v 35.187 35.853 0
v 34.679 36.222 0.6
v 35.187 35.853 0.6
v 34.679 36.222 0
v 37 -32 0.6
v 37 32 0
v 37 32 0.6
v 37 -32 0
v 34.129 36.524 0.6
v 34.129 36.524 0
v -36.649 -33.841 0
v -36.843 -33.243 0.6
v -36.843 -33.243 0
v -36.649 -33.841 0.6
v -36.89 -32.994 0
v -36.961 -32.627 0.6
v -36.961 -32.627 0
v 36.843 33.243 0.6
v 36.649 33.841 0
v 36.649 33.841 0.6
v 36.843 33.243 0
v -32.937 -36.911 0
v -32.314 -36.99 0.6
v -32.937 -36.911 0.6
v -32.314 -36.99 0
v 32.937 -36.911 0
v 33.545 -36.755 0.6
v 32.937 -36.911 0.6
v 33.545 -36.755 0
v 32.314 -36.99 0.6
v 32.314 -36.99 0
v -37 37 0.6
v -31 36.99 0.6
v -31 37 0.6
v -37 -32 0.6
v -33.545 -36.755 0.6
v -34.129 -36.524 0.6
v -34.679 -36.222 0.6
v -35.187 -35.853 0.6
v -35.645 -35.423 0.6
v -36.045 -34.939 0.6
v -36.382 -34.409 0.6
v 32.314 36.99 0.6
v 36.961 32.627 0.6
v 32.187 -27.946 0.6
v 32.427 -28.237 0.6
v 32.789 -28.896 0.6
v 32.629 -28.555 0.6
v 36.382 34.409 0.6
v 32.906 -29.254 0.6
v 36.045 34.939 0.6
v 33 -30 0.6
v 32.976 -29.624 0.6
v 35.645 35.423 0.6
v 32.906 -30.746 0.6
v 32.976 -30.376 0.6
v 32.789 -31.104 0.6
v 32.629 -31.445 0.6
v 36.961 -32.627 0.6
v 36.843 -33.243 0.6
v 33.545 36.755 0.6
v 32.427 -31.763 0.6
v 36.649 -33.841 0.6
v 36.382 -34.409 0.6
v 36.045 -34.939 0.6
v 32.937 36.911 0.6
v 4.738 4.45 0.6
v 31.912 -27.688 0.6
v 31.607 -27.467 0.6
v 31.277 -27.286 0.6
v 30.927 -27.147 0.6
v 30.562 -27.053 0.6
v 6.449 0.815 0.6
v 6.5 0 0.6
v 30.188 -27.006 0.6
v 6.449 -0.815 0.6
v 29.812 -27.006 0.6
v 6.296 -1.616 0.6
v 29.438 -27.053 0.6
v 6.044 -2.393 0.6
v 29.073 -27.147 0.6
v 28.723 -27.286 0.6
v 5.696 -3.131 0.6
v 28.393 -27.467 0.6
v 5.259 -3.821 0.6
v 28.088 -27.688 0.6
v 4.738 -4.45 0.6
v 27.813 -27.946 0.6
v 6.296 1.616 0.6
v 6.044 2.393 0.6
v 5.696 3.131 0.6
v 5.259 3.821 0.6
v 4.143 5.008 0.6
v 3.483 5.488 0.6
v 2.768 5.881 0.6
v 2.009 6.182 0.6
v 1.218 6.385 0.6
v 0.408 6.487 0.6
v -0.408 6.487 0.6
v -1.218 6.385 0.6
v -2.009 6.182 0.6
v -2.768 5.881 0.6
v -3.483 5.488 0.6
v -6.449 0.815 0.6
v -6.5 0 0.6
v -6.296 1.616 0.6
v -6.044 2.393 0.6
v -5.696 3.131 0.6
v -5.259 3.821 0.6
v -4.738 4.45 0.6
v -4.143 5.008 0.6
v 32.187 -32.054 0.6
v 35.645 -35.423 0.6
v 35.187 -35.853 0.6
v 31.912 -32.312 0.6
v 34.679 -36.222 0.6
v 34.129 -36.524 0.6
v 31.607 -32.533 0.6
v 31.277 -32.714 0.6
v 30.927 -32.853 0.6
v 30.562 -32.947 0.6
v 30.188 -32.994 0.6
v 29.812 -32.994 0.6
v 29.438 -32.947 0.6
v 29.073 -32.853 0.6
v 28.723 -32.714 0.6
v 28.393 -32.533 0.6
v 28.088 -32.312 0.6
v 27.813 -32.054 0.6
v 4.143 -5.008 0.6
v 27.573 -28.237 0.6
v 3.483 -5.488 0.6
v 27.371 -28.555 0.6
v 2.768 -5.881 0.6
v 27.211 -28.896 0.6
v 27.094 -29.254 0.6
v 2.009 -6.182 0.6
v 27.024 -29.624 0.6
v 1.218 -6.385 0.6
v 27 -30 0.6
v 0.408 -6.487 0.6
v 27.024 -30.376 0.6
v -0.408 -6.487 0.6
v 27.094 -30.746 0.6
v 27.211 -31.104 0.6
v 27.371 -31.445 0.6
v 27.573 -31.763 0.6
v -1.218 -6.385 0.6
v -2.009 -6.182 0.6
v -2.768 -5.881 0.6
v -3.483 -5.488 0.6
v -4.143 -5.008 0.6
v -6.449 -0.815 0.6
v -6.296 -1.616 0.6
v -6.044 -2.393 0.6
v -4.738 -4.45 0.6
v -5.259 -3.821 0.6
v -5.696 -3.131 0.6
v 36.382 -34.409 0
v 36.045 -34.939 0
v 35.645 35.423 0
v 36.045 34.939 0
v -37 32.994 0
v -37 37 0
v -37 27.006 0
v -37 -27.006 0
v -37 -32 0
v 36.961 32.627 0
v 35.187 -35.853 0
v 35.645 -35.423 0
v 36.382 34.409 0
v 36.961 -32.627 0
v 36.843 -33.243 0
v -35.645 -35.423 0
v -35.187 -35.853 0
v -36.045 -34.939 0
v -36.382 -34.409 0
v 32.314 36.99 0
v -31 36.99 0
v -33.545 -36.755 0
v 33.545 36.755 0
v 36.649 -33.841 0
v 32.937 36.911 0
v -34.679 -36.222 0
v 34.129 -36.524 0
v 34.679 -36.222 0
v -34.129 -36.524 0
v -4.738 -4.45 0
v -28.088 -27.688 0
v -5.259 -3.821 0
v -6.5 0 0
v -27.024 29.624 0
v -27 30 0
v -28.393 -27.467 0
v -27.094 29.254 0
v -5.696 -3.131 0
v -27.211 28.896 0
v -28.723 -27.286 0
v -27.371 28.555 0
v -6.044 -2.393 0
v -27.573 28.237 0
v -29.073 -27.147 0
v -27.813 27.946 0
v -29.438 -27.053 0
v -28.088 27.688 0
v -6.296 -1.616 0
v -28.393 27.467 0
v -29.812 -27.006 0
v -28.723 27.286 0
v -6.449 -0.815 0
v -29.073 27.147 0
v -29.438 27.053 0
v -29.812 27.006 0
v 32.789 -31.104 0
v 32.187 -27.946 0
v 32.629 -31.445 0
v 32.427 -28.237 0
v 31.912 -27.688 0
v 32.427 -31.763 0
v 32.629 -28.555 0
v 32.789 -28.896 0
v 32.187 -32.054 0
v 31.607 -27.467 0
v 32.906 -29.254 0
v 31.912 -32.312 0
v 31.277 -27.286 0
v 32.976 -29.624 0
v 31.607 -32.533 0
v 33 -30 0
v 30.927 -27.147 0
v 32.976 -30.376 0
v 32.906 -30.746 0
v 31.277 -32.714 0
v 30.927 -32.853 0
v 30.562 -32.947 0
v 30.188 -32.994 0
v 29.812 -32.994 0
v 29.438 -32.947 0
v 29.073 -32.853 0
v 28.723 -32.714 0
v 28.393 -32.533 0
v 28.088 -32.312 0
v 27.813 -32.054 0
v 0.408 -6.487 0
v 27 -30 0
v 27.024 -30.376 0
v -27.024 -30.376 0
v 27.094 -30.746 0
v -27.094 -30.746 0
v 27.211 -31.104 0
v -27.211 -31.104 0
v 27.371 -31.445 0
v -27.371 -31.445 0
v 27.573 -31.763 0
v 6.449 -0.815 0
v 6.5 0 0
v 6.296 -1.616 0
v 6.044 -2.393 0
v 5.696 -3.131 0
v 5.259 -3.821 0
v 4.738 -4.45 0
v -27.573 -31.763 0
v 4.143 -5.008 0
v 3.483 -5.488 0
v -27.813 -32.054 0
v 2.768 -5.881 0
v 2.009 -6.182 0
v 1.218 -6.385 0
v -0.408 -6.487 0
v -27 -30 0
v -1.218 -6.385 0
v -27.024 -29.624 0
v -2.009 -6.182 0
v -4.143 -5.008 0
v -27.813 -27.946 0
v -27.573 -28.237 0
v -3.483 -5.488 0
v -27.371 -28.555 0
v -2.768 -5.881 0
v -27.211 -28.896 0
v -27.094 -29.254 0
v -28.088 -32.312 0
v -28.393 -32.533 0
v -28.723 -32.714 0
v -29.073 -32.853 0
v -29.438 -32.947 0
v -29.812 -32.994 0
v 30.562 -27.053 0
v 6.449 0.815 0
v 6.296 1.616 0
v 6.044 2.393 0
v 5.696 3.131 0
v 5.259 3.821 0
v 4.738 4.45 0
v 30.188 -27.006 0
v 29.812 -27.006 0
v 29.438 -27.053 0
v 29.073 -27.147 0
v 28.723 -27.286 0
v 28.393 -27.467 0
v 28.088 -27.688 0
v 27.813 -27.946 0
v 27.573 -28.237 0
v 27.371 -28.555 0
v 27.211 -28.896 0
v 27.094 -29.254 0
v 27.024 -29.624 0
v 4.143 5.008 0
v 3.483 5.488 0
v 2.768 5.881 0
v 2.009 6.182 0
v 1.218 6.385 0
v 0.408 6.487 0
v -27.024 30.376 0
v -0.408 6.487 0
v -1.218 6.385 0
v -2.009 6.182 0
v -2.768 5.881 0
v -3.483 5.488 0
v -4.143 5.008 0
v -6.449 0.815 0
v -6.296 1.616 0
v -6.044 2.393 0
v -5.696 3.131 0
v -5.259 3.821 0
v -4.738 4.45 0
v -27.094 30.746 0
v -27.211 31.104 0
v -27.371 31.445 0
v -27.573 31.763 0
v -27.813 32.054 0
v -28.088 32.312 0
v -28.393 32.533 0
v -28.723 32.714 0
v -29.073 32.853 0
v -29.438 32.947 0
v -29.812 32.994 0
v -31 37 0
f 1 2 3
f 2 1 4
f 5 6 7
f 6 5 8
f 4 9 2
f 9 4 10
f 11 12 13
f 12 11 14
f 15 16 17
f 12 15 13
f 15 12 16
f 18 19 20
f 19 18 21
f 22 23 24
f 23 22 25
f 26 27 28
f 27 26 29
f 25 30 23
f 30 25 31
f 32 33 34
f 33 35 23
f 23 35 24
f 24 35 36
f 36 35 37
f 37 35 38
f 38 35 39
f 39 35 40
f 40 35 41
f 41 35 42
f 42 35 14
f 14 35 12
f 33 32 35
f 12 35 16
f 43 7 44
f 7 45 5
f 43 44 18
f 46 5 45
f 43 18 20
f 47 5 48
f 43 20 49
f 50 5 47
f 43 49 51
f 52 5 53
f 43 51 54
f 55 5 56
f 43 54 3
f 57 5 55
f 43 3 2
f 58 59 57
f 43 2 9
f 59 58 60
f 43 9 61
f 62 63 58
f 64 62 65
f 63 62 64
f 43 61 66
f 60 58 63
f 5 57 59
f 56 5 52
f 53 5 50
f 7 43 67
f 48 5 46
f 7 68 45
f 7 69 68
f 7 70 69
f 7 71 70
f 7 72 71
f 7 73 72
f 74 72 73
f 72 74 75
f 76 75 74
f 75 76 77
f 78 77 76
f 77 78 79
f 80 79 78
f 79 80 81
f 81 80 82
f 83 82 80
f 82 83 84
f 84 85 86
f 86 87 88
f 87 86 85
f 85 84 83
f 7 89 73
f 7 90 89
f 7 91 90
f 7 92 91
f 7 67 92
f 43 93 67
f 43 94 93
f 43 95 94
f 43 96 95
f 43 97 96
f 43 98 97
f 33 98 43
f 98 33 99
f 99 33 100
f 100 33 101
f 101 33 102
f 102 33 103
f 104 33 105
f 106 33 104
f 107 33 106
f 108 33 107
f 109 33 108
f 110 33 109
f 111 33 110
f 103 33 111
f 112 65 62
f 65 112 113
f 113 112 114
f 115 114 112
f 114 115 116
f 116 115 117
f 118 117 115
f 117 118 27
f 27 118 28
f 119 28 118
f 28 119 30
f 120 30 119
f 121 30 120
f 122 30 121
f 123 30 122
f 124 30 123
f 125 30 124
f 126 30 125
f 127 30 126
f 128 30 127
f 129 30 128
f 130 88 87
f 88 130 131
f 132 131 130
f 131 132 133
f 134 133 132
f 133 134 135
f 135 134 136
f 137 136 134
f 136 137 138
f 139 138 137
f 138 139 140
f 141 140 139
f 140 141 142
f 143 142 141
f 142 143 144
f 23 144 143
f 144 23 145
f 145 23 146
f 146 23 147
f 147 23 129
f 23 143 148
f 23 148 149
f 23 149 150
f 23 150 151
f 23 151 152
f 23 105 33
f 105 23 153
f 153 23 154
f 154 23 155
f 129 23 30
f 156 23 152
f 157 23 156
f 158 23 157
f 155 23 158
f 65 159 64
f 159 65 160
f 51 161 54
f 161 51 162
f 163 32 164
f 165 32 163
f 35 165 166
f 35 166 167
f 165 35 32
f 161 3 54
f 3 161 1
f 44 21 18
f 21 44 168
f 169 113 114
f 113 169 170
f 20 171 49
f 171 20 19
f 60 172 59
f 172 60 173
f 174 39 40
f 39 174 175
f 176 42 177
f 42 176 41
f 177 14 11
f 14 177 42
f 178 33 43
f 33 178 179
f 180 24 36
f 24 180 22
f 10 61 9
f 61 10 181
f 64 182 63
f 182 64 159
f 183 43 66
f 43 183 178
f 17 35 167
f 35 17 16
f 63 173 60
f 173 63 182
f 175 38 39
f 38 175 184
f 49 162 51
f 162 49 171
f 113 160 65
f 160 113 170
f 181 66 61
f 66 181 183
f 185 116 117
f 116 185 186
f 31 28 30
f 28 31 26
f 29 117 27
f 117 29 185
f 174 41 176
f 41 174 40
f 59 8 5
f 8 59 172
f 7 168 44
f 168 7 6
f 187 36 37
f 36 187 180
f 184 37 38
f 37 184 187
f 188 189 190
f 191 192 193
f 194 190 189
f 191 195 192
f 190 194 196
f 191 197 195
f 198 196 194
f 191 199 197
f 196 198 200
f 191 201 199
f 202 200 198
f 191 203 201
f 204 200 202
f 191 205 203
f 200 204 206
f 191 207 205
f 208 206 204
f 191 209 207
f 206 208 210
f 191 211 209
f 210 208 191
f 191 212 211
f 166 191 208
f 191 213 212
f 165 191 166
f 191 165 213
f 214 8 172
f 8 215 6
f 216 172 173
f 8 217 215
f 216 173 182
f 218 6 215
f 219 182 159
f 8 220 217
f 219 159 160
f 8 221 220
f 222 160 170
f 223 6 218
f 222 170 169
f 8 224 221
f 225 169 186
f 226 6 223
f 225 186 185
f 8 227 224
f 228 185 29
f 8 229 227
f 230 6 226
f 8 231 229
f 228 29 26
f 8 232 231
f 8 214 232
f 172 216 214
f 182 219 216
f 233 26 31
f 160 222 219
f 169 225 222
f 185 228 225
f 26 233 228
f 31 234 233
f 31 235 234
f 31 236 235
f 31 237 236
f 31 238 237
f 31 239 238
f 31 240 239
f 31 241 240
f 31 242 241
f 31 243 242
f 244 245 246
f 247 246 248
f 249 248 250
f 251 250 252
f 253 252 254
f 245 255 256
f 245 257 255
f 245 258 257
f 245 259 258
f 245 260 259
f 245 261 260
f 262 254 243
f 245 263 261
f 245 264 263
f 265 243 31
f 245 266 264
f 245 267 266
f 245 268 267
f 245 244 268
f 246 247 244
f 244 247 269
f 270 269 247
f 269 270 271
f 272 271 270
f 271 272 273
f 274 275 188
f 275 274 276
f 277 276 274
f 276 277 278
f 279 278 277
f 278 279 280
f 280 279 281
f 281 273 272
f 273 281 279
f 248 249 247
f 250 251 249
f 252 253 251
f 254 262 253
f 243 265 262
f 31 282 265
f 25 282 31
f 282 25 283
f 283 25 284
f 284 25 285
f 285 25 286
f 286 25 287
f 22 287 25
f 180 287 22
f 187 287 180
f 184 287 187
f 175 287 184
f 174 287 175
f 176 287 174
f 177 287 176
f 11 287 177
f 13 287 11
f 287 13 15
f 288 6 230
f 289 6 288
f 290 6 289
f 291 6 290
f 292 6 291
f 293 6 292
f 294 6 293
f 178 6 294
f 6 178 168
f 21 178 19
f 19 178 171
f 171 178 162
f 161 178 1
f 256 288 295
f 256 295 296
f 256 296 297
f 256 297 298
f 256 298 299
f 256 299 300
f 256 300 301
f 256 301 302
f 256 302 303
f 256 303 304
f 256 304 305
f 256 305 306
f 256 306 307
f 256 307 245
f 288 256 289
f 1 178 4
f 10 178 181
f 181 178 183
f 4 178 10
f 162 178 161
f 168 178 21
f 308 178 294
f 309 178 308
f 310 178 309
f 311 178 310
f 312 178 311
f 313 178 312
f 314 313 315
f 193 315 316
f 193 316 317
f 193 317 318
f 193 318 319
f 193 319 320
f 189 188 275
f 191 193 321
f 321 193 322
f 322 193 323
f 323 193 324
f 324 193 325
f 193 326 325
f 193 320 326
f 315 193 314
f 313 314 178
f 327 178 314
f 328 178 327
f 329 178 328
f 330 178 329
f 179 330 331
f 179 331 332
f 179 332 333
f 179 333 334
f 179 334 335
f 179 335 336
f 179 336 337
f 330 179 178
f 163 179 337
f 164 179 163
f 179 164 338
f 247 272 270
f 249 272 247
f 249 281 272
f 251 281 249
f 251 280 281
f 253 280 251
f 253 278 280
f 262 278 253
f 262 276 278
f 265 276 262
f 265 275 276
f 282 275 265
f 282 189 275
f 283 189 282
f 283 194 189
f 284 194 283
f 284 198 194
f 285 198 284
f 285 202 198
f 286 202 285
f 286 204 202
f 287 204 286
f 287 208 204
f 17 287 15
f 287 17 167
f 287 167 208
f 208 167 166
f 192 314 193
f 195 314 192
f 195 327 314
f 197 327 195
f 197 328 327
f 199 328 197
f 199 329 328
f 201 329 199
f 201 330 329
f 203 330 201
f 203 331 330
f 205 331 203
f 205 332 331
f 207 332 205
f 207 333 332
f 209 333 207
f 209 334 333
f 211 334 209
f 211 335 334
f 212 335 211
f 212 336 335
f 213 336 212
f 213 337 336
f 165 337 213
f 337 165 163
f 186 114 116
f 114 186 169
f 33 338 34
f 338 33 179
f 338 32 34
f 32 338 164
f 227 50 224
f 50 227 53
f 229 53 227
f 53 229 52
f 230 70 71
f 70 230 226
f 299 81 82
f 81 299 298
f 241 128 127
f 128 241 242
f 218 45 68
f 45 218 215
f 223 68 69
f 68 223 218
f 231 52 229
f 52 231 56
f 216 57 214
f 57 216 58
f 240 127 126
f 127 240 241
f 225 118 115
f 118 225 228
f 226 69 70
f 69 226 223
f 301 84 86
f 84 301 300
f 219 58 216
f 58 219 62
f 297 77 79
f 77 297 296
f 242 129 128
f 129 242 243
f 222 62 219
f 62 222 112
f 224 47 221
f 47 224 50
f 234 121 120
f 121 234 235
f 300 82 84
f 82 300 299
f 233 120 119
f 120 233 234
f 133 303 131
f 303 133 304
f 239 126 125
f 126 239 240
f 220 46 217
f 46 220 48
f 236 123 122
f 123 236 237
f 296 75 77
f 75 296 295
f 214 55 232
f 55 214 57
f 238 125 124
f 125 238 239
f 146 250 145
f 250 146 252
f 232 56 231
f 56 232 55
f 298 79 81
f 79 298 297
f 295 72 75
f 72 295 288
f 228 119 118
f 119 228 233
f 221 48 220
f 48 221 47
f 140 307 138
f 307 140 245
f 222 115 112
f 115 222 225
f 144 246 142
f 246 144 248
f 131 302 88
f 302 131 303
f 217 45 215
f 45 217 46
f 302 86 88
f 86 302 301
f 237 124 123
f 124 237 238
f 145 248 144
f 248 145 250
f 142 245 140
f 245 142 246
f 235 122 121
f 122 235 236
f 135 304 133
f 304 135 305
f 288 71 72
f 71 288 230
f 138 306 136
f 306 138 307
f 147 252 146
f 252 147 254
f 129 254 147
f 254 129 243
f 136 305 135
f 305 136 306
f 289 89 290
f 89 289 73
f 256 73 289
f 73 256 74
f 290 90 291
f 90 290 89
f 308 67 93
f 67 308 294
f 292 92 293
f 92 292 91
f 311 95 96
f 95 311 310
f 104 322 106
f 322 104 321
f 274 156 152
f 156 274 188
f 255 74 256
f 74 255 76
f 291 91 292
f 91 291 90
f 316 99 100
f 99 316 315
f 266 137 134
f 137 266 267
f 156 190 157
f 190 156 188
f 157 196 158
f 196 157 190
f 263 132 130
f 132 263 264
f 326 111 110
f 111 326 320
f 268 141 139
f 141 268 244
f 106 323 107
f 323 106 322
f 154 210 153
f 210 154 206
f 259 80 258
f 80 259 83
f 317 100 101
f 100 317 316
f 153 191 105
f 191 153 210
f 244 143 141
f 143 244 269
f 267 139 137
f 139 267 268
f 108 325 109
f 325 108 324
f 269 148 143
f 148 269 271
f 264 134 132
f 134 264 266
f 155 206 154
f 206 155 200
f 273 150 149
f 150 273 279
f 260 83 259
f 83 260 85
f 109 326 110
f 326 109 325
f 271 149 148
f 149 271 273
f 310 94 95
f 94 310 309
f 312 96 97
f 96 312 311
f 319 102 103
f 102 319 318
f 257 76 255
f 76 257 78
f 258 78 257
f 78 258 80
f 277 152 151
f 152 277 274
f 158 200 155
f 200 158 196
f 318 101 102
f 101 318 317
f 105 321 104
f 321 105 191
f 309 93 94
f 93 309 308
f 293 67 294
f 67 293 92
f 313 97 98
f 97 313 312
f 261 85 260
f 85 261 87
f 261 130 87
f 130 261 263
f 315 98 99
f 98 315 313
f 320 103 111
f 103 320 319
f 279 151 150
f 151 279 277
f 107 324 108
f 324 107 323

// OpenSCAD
$fn = 50;


difference() {
	union() {
		hull() {
			translate(v = [-32.0000000000, 32.0000000000, 0]) {
				cylinder(h = 0.6000000000, r = 5);
			}
			translate(v = [32.0000000000, 32.0000000000, 0]) {
				cylinder(h = 0.6000000000, r = 5);
			}
			translate(v = [-32.0000000000, -32.0000000000, 0]) {
				cylinder(h = 0.6000000000, r = 5);
			}
			translate(v = [32.0000000000, -32.0000000000, 0]) {
				cylinder(h = 0.6000000000, r = 5);
			}
		}
		translate(v = [-37.0000000000, 31.0000000000, 0]) {
			cube(size = [6, 6, 0.6000000000]);
		}
	}
	union() {
		translate(v = [-37.5000000000, -30.0000000000, -250.0000000000]) {
			rotate(a = [0, 0, 0]) {
				difference() {
					union() {
						hull() {
							translate(v = [7.5000000000, 0, 0]) {
								cylinder(h = 250, r = 3.0000000000, r1 = 3.0000000000, r2 = 3.0000000000);
							}
							translate(v = [-7.5000000000, 0, 0]) {
								cylinder(h = 250, r = 3.0000000000, r1 = 3.0000000000, r2 = 3.0000000000);
							}
						}
					}
					union();
				}
			}
		}
		translate(v = [-37.5000000000, 30.0000000000, -250.0000000000]) {
			rotate(a = [0, 0, 0]) {
				difference() {
					union() {
						hull() {
							translate(v = [7.5000000000, 0, 0]) {
								cylinder(h = 250, r = 3.0000000000, r1 = 3.0000000000, r2 = 3.0000000000);
							}
							translate(v = [-7.5000000000, 0, 0]) {
								cylinder(h = 250, r = 3.0000000000, r1 = 3.0000000000, r2 = 3.0000000000);
							}
						}
					}
					union();
				}
			}
		}
		translate(v = [30.0000000000, -30.0000000000, 0]) {
			cylinder(h = 100, r = 3.0000000000);
		}
		cylinder(h = 0.6000000000, r = 6.5000000000);
	}
}
